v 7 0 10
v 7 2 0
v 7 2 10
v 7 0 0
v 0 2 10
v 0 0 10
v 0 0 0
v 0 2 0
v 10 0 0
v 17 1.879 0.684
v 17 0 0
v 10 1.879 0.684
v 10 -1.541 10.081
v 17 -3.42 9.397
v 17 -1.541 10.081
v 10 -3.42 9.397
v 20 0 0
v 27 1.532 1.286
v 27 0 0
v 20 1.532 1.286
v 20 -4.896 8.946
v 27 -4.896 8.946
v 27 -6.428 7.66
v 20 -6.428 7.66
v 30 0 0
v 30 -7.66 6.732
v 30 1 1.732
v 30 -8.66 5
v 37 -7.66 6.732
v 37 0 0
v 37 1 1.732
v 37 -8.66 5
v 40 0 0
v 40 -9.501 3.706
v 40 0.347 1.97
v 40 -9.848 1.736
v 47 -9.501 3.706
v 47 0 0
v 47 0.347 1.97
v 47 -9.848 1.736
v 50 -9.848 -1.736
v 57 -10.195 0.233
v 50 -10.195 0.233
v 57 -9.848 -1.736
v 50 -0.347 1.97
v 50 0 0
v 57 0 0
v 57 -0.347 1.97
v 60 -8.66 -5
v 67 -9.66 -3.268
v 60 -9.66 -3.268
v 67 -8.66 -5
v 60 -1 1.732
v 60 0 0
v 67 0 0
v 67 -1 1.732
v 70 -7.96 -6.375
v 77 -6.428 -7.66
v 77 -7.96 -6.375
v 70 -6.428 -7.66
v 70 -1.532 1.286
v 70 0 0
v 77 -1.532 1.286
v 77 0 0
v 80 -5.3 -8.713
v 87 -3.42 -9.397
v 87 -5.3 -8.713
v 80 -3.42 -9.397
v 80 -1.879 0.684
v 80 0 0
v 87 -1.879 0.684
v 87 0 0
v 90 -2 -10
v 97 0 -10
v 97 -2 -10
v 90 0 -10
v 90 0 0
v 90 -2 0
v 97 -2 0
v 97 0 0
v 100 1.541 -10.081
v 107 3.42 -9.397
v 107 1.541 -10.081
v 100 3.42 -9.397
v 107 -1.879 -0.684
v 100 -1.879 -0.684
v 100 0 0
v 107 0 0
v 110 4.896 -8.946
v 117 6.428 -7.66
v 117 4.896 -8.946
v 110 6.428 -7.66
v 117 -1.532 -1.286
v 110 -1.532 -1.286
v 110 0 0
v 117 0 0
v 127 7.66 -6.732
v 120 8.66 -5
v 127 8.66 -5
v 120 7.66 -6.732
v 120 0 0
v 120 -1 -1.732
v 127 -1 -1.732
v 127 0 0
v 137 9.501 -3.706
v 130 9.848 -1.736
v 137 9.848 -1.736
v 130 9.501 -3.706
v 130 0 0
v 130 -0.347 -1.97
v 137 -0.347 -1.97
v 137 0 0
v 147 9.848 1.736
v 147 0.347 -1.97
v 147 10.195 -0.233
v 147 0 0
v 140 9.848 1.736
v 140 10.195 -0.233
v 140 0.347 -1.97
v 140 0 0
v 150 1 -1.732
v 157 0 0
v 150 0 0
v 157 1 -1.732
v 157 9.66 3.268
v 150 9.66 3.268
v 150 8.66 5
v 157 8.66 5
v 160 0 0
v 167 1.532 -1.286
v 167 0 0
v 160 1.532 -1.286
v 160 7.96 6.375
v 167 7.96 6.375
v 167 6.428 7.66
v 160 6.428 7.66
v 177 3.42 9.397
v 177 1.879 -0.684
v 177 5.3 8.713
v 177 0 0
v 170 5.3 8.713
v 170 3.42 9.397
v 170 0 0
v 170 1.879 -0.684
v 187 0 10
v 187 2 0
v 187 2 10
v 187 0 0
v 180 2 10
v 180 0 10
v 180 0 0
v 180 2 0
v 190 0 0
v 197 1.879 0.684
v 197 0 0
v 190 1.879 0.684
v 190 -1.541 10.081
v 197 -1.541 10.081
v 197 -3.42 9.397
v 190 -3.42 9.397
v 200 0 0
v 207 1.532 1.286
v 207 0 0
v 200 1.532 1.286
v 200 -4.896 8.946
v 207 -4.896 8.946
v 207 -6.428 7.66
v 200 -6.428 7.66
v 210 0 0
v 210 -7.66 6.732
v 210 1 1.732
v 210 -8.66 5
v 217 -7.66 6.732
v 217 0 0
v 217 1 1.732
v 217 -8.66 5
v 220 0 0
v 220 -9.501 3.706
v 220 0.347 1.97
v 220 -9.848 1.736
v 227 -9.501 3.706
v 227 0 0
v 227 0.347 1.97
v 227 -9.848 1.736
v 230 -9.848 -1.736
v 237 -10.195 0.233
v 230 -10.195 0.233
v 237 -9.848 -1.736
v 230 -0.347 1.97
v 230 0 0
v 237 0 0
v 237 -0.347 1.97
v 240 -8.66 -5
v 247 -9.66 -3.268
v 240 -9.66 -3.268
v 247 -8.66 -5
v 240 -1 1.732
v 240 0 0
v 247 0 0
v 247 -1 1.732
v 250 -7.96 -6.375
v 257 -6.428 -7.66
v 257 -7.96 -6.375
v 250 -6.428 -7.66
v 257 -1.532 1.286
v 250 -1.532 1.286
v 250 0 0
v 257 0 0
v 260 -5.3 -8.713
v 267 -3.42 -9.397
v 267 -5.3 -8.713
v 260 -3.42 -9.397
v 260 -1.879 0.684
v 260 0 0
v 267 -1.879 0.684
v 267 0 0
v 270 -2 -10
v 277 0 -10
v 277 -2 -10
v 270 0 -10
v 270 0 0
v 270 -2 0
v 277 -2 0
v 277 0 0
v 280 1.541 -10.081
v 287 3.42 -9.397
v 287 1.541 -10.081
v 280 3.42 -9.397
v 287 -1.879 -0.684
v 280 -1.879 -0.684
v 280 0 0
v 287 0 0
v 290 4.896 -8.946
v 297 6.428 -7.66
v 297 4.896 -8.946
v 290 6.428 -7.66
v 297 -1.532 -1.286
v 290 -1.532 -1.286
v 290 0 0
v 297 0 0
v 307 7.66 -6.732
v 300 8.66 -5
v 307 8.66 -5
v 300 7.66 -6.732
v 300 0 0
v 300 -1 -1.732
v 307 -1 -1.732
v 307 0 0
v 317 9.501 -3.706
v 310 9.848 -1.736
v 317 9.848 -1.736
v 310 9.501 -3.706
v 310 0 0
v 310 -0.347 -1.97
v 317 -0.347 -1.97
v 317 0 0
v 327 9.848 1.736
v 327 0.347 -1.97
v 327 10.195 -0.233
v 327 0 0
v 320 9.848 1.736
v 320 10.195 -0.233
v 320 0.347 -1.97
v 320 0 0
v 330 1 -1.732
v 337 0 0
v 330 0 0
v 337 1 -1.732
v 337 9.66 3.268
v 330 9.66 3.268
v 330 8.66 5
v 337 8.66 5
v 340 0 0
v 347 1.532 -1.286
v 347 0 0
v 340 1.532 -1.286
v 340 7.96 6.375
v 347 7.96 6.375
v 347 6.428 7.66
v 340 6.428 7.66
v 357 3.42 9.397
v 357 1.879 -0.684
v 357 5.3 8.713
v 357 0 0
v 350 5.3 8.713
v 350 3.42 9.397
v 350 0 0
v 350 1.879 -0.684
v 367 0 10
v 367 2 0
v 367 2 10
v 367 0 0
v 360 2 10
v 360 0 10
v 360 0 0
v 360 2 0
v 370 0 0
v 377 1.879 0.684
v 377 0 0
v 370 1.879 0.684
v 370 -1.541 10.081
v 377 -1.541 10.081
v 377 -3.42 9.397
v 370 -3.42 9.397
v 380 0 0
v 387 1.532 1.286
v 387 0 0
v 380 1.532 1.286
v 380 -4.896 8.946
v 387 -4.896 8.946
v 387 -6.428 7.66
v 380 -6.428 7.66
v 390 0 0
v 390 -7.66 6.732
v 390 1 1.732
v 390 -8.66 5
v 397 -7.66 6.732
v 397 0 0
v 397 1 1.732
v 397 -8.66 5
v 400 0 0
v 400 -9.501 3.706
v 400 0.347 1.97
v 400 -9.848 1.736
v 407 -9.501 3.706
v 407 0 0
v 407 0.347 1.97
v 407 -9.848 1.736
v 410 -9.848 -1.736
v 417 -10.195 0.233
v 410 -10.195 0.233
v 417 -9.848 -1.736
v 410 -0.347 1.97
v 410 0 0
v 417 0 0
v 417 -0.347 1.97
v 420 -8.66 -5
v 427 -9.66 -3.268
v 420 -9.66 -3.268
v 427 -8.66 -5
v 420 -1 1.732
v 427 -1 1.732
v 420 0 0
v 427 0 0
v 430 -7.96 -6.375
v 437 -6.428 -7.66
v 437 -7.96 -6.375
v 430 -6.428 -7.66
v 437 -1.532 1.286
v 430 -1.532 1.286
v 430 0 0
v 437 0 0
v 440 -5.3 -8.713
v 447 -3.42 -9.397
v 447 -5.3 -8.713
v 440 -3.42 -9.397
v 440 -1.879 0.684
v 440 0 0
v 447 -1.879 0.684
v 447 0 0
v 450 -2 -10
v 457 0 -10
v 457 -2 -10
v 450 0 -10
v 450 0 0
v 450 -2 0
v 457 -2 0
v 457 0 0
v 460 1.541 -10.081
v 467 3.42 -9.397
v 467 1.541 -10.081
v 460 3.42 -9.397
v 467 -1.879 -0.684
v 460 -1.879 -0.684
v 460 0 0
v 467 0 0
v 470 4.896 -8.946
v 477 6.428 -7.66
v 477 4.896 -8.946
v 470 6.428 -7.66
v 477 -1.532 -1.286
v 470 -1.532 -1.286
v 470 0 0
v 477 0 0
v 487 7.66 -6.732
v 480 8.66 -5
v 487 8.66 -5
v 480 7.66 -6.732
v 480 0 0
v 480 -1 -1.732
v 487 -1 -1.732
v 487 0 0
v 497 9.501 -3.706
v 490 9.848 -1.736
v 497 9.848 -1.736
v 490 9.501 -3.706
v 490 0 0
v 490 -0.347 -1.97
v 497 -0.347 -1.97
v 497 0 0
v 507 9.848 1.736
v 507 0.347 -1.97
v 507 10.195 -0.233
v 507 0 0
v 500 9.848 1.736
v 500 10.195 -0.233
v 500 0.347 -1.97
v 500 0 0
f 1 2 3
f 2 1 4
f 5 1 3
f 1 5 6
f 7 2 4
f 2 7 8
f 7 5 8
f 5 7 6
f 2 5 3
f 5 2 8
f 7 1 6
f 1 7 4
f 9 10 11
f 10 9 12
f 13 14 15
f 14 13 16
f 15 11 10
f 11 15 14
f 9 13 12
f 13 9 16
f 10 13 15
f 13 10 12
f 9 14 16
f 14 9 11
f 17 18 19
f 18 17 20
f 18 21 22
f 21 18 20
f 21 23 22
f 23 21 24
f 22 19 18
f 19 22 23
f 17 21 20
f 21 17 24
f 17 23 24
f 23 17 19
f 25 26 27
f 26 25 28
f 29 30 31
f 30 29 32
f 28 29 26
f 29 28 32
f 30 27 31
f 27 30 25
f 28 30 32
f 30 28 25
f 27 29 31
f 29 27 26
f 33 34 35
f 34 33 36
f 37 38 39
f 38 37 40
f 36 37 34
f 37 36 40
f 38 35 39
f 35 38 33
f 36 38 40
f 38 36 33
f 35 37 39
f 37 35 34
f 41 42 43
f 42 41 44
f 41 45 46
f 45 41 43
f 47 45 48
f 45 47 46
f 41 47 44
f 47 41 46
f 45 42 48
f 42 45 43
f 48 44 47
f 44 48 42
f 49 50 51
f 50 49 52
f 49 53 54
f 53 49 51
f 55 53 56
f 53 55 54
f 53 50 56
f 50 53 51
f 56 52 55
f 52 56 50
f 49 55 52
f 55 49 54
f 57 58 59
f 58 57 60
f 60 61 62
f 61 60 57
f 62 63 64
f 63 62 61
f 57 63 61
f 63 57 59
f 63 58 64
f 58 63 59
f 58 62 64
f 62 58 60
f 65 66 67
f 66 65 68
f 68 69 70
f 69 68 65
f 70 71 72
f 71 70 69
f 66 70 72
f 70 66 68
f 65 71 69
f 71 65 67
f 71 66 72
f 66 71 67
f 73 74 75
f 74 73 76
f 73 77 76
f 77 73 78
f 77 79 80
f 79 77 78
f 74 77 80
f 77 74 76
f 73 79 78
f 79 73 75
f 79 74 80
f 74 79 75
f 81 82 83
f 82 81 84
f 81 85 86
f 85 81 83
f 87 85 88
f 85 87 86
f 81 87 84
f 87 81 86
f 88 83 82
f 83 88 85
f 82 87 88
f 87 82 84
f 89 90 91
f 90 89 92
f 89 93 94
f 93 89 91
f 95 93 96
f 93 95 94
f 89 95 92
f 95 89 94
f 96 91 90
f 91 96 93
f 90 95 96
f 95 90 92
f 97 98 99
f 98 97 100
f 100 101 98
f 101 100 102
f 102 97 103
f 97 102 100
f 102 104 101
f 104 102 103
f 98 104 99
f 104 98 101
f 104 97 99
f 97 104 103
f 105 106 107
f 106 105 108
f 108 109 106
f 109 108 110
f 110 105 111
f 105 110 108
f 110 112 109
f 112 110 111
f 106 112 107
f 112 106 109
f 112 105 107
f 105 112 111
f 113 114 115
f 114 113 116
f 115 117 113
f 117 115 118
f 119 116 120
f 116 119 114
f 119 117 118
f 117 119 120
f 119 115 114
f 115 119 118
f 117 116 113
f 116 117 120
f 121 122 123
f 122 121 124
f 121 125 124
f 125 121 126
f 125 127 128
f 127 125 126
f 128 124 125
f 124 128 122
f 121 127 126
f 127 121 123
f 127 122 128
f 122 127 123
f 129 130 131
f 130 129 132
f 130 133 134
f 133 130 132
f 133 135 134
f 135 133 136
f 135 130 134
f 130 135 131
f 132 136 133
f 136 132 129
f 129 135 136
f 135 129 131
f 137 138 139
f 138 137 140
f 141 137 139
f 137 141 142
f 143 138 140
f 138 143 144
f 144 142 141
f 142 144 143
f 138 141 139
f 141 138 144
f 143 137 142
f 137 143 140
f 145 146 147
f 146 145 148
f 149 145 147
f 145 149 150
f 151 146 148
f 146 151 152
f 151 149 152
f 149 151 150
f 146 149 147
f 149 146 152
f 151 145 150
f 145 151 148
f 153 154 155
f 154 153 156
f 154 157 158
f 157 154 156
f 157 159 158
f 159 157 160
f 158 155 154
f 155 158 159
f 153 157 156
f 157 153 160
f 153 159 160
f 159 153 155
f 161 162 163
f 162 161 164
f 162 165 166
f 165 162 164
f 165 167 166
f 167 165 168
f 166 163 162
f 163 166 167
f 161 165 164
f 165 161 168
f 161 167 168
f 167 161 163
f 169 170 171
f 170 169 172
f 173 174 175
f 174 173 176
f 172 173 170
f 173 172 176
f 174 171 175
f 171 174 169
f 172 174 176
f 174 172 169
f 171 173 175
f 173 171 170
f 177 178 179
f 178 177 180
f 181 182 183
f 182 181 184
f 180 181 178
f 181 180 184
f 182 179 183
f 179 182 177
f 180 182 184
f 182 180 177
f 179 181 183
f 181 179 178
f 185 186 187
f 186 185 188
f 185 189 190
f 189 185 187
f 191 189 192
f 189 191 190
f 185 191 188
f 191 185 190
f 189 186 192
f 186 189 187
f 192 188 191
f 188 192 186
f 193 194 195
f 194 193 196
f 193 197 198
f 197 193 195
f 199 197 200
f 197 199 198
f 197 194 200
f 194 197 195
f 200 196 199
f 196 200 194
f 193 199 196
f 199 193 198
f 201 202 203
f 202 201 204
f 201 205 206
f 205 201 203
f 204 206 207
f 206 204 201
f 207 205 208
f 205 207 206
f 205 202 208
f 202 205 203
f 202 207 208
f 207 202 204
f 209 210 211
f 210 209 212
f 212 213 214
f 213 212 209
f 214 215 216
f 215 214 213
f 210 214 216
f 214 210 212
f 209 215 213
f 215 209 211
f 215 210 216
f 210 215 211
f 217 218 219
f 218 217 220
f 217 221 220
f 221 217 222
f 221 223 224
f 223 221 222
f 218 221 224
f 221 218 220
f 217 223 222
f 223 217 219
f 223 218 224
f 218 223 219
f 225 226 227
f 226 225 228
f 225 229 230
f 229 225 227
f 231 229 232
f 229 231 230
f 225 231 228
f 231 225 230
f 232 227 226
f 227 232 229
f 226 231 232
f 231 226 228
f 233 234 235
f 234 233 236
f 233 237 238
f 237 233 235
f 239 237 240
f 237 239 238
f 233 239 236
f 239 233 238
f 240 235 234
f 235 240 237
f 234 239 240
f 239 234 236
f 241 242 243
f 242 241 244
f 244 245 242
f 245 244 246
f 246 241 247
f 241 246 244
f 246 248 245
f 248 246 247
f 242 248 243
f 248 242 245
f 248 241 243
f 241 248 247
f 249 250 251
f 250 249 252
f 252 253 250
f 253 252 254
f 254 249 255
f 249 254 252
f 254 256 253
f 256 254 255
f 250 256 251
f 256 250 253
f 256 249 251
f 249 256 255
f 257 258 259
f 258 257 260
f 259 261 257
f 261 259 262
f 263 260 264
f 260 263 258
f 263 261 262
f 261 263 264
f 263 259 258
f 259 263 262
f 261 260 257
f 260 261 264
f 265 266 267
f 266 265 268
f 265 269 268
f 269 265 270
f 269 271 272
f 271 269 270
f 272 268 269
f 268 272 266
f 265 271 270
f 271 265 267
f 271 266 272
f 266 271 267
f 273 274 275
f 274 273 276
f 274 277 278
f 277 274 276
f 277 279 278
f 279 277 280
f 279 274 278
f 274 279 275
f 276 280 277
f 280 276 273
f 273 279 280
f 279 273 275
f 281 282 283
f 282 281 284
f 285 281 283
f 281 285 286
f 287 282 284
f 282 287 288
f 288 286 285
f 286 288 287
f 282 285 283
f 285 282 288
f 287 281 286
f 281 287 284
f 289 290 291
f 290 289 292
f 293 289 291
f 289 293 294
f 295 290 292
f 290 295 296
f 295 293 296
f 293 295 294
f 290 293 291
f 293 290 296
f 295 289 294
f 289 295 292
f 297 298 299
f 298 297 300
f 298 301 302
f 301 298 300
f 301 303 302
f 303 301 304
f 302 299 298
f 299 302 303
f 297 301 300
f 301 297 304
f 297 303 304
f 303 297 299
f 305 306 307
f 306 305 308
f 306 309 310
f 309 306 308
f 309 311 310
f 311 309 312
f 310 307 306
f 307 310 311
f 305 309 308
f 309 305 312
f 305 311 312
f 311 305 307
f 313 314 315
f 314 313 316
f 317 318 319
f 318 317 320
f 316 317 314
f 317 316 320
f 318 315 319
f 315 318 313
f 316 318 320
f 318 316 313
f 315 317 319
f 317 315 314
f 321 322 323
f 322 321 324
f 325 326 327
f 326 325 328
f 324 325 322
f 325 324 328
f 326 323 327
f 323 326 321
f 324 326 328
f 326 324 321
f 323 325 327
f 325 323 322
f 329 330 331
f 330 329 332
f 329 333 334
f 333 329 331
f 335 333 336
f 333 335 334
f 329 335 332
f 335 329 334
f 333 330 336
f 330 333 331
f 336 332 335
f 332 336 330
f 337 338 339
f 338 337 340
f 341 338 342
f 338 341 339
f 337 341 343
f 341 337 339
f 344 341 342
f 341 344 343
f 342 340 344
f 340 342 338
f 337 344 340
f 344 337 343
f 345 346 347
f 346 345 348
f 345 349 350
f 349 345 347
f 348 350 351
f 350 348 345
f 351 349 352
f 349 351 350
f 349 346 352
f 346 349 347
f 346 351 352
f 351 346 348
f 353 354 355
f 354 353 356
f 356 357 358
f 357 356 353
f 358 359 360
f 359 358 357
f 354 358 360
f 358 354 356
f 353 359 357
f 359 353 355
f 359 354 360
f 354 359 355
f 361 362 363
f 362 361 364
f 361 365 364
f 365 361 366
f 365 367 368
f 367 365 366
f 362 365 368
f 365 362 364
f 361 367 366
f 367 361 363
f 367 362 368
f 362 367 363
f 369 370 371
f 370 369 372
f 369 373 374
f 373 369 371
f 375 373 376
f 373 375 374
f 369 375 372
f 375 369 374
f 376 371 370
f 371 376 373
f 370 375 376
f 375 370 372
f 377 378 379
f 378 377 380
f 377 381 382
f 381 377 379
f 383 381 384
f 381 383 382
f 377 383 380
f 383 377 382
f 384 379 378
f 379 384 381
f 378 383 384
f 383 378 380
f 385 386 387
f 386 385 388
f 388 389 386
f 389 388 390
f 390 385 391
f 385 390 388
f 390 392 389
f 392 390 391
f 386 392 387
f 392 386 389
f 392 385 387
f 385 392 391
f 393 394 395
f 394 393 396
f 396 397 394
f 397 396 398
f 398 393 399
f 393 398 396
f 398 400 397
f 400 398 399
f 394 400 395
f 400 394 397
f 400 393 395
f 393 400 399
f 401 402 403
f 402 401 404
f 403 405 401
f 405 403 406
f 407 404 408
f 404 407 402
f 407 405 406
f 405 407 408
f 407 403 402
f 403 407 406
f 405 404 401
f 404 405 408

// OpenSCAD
a = 7; //[5:10]
b = 2; //[2:10]
c = 10; //[10:20]
d = 20; //[20:50]


line(a,b,c);

module line(a,b,c){

for(i=[0:1:50]){
    
    translate([i*10,0,0])
    rotate([i*d,0,0])
    cube([a,b,c], 0);
    
    };
}
